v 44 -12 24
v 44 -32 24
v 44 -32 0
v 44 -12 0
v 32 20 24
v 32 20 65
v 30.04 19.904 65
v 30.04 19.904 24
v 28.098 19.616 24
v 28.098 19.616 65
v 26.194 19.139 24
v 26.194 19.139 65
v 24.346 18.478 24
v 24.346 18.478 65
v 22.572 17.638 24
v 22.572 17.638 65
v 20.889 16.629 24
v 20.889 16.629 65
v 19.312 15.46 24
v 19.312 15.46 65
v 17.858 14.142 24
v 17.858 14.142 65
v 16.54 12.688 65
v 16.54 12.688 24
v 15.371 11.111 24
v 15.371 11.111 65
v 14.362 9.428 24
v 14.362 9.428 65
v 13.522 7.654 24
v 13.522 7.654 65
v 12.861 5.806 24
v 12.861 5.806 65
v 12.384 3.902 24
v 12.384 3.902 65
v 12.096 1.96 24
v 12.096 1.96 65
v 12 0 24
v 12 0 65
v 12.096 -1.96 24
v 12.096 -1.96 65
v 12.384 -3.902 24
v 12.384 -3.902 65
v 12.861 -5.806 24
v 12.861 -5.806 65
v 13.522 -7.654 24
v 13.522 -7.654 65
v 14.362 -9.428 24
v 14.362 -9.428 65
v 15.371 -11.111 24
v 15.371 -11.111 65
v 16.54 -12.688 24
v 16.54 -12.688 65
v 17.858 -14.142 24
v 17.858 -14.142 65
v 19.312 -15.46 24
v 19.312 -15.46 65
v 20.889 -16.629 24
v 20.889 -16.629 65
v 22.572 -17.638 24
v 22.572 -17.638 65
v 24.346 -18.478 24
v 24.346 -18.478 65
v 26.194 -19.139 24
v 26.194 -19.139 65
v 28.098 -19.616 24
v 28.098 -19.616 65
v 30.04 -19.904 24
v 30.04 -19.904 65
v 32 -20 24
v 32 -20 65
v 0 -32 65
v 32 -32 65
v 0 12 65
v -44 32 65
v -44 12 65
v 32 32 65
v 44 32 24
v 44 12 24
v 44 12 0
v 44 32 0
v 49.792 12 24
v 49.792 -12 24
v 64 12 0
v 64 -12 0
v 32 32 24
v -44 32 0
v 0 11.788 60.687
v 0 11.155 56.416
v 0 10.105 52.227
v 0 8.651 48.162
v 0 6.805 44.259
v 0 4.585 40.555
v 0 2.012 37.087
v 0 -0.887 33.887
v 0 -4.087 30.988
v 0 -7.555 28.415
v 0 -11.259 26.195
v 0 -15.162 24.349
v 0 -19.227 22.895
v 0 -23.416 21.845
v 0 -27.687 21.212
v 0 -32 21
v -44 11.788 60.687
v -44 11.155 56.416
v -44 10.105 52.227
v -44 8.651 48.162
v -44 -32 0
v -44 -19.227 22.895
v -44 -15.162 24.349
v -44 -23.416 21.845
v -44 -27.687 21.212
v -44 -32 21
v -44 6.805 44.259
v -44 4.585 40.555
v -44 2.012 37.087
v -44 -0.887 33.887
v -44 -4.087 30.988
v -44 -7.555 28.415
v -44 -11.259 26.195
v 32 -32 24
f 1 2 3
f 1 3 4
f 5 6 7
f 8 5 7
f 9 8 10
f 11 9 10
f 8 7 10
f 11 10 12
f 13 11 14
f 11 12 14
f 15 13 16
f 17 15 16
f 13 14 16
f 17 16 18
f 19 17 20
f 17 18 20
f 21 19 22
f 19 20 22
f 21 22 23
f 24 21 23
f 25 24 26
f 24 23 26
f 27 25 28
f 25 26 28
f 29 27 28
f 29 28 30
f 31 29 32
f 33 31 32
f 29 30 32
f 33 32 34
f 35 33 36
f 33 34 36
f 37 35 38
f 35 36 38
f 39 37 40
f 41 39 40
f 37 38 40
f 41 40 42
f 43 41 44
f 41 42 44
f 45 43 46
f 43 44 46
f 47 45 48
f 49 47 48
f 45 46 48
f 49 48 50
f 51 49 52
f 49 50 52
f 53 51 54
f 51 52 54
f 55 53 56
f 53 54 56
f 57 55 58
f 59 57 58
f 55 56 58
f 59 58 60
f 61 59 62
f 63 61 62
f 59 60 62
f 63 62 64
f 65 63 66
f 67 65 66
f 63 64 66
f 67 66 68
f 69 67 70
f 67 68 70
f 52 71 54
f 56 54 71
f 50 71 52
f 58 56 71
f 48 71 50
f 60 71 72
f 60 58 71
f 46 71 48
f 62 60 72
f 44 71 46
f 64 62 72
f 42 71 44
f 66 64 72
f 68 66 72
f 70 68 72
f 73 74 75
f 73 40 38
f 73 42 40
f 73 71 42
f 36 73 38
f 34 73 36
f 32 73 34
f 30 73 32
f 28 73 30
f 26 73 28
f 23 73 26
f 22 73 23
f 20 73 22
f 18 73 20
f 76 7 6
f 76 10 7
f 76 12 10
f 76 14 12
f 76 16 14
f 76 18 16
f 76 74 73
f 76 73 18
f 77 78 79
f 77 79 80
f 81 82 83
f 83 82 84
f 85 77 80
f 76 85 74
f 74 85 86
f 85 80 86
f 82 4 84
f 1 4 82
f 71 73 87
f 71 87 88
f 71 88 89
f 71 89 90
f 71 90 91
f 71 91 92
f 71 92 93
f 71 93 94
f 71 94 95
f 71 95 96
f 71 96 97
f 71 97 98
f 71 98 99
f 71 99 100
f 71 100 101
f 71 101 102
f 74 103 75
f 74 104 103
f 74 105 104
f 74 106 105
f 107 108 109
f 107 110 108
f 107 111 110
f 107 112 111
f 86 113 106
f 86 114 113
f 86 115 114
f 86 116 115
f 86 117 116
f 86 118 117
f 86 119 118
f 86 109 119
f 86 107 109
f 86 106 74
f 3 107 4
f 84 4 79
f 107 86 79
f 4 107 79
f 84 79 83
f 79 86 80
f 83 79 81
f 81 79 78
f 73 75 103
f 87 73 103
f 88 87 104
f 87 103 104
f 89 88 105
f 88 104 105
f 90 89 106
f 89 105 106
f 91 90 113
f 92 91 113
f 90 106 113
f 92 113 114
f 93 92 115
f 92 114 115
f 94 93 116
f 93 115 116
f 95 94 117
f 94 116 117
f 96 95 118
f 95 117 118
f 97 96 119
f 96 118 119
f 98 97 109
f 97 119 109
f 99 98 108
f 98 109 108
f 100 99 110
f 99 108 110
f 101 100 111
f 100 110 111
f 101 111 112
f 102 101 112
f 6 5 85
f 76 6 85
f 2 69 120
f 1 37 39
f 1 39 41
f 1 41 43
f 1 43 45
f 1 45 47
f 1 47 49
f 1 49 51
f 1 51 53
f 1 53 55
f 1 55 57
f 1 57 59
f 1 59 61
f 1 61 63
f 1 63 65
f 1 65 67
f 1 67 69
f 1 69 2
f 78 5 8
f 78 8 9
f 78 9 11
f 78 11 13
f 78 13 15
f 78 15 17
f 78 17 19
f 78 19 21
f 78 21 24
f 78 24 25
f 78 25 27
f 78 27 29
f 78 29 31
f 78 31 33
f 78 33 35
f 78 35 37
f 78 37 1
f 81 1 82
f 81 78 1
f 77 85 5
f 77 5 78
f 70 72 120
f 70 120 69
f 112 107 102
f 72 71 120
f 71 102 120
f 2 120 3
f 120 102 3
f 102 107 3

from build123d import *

# Parameters (mm, degrees)
F0_W      = 12
F0_H      = 64
F1_DEPTH  = 24
F2_DEPTH  = 65
F3_W      = 24
F3_H      = 24
F4_DEPTH  = 20
F6_DEPTH  = 37.6
F8_DEPTH  = 41
F9_W      = 44
F9_H      = 44
F10_DEPTH = 12
F11_W     = 44
F11_H     = 44
F12_DEPTH = 53
F14_DEPTH = 44


with BuildPart() as f1:
    # F0 (on Top) → F1 (new body)
    with BuildSketch(Plane.XY):
        with Locations((38, 0)):
            Rectangle(F0_W, F0_H)
    extrude(amount=F1_DEPTH)

    # F0 (on Top) → F2 (join)
    with BuildSketch(Plane.XY):
        Polygon((32, -32), (32, 32), (-44, 32), (-44, 12), (0, 12), (0, -32), align=None)
    extrude(amount=F2_DEPTH)

    # F3 (on face) → F4 (join)
    with BuildSketch(Plane.YZ.offset(44)):
        with Locations((0, 12)):
            Rectangle(F3_W, F3_H)
    extrude(amount=F4_DEPTH)

    # F5 (on face) → F6 (cut)
    with BuildSketch(Plane.XZ.offset(12)):
        Polygon((64, 24), (49.7921183705, 24), (64, 0), align=None)
    extrude(amount=-F6_DEPTH, mode=Mode.SUBTRACT)

    # F7 (on face) → F8 (cut)
    with BuildSketch(Plane.XY.offset(65)):
        with BuildLine():
            ThreePointArc((32, 20), (12, 0), (32, -20))
            Line((32, -20), (32, 20))
        make_face()
    extrude(amount=-F8_DEPTH, mode=Mode.SUBTRACT)

    # F9 (on face) → F10 (join)
    with BuildSketch(Plane.XY):
        with Locations((-22, -10)):
            Rectangle(F9_W, F9_H)
    extrude(amount=F10_DEPTH)

    # F11 (on face) → F12 (join)
    with BuildSketch(Plane.XY.offset(12)):
        with Locations((-22, -10)):
            Rectangle(F11_W, F11_H)
    extrude(amount=F12_DEPTH)

    # F13 (on face) → F14 (cut)
    with BuildSketch(Plane(origin=(-44, 0, 0), x_dir=(0, -1, 0), z_dir=(-1, 0, 0))):
        with BuildLine():
            Line((32, 65), (-12, 65))
            ThreePointArc((-12, 65), (0.8873016278, 33.8873016278), (32, 21))
            Line((32, 21), (32, 65))
        make_face()
    extrude(amount=-F14_DEPTH, mode=Mode.SUBTRACT)


solid = f1.part
